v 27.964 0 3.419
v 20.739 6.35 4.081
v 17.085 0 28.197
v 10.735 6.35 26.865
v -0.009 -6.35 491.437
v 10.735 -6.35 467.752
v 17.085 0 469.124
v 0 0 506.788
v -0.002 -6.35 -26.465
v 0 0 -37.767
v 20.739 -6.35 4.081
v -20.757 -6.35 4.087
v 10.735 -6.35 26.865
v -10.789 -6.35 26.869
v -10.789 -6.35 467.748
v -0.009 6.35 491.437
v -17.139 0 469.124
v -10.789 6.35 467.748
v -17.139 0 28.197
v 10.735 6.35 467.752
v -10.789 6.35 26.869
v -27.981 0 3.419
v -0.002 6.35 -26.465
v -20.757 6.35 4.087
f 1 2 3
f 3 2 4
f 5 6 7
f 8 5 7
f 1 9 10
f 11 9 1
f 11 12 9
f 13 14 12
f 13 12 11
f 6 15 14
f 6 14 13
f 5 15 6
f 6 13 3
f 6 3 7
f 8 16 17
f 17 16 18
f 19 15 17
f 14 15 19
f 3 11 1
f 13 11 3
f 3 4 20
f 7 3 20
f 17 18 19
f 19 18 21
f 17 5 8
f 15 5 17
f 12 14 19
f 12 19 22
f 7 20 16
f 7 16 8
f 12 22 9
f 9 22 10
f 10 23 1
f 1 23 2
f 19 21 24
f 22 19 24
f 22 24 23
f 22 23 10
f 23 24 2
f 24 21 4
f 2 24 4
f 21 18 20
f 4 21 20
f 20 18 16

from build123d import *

# Parameters (mm, degrees)
F1_DEPTH = 6.35
F2_DEPTH = 6.35
F3_SIZE2 = 6.34999
F3_SIZE  = 6.34999


# Not quite as in the source:
# - a fillet or chamfer is up to 0.001 mm smaller than in the source, because OpenCascade refuses the exact size


with BuildPart() as f1:
    # F0 (on Front) → F1 (new body)
    with BuildSketch(Plane.XZ):
        Polygon((-17.139416188, 28.1973872334), (-27.9807504267, 3.4191238228), (0, -37.7674587071), (27.964355424, 3.4191238228), (17.08493568, 28.1973872334), (17.08493568, 469.1244959831), (0, 506.7884922028), (-17.139416188, 469.1244959831), align=None)
    extrude(amount=F1_DEPTH)

    # F2 (add): a face of the model
    f2_faces = [f1.faces().sort_by_distance(p)[0] for p in [
        (-0.0248835797, 0, 225.9211420486),
    ]]
    extrude(f2_faces, amount=F2_DEPTH)

    # F3 (size 6.35 and 6.35 in the source; OpenCascade refuses exactly that, so slightly less here)
    f3_edges = [f1.edges().sort_by_distance(p)[0] for p in [
        (-22.560083, -6.35, 15.808256),
        (-13.990375, -6.35, -17.174167),
        (13.982178, -6.35, -17.174167),
        (22.524646, -6.35, 15.808256),
        (17.084936, -6.35, 248.660942),
        (8.542468, -6.35, 487.956494),
        (-8.569708, -6.35, 487.956494),
        (-17.139416, -6.35, 248.660942),
        (-22.560083, 6.35, 15.808256),
        (-13.990375, 6.35, -17.174167),
        (13.982178, 6.35, -17.174167),
        (22.524646, 6.35, 15.808256),
        (17.084936, 6.35, 248.660942),
        (8.542468, 6.35, 487.956494),
        (-8.569708, 6.35, 487.956494),
        (-17.139416, 6.35, 248.660942),
    ]]
    chamfer(f3_edges, length=F3_SIZE, length2=F3_SIZE2)


solid = f1.part
